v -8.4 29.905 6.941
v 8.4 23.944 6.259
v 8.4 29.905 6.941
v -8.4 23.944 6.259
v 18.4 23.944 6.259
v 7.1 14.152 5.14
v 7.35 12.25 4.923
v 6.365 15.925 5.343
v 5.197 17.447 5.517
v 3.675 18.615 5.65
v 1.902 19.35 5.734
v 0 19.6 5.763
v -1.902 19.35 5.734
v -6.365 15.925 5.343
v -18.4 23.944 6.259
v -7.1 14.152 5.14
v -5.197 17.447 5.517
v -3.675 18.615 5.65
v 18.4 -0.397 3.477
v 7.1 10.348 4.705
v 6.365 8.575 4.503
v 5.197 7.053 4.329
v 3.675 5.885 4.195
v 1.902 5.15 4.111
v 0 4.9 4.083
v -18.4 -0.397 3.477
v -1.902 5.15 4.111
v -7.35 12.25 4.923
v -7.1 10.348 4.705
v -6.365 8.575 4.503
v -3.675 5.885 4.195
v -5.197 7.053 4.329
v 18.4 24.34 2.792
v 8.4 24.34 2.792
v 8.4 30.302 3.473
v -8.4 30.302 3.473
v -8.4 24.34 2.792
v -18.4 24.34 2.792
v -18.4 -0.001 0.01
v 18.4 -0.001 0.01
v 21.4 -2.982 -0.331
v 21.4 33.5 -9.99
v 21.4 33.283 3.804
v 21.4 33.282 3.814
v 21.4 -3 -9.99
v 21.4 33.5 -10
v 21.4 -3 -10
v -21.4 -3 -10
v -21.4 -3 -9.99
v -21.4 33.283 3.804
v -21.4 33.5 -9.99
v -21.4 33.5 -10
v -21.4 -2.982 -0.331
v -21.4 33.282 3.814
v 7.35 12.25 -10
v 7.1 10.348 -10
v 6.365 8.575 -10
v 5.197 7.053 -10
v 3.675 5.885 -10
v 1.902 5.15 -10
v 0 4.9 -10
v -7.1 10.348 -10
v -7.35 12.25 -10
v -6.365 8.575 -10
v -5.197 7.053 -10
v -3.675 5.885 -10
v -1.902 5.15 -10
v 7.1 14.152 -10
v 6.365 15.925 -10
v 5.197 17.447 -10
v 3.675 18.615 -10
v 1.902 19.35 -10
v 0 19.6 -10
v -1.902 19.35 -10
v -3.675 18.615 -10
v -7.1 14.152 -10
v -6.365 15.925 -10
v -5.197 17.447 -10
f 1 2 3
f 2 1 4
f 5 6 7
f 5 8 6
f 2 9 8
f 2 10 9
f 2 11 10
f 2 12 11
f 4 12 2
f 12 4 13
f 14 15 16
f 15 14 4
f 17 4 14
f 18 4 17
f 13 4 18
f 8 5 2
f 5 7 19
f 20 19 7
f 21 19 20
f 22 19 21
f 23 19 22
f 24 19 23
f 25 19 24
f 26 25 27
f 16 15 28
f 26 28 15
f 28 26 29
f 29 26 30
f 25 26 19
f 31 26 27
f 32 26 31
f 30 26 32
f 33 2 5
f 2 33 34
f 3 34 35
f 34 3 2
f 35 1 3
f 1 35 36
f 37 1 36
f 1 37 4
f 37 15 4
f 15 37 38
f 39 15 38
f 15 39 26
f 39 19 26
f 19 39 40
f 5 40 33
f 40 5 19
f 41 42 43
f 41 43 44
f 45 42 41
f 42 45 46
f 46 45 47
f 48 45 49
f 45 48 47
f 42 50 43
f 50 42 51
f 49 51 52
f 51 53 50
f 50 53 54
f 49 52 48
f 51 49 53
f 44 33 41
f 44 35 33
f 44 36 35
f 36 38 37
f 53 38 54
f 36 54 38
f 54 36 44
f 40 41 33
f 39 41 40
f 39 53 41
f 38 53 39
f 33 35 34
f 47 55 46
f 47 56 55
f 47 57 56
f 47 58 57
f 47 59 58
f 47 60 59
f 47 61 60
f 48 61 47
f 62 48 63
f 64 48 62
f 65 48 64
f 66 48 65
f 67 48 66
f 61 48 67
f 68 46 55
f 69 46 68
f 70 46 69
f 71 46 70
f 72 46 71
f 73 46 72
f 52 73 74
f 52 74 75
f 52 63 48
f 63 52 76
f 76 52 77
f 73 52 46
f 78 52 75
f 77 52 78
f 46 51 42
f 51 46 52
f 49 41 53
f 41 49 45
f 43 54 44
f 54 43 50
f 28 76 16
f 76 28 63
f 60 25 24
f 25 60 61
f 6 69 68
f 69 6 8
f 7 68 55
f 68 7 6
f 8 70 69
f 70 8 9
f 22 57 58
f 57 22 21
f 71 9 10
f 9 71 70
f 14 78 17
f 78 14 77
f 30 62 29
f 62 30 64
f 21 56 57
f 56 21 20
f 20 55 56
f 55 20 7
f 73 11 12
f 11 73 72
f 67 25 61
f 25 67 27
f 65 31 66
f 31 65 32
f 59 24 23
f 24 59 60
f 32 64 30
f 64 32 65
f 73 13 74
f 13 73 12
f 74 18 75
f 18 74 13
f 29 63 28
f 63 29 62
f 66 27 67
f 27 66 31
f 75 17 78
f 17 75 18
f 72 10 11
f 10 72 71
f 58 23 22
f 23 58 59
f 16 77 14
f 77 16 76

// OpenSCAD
// replacement feet for Logitech K120

INSERT_H = 3.5;

T_WIDTH = 16.8;
BAR_HEIGHT = 24.5;

FAR_EDGE_DISTANCE = 70;
DESIRED_H = 10;  // at the top of the T
SURVIVING_FEET_OFFSET = 2;
ROT = atan2(DESIRED_H - SURVIVING_FEET_OFFSET, FAR_EDGE_DISTANCE);

module insert_2d(h_expand=10, v_expand=6) {
    translate([-T_WIDTH / 2 - h_expand, 0])
    square([T_WIDTH + h_expand * 2, BAR_HEIGHT])
        ;
    translate([-T_WIDTH / 2, 0])
    square([T_WIDTH, BAR_HEIGHT + v_expand])
        ;
}

module surrounder_plate(h_expand=13, v_expand=12)
linear_extrude(0.01)
translate([-T_WIDTH / 2 - h_expand, -(v_expand-6)/2])
square([T_WIDTH + h_expand * 2, BAR_HEIGHT + v_expand])
    ;

module cap_solid() {
    rotate([ROT, 0, 0])
    linear_extrude(INSERT_H)
    insert_2d()
        ;
    hull() {
        rotate([ROT, 0, 0])
        surrounder_plate()
            ;
        translate([0, 0, -DESIRED_H])
        surrounder_plate()
            ;
    }
        ;
}

difference() {
    cap_solid()
        ;
    // for easier sticking (and un-sticking!)
    translate([0, BAR_HEIGHT / 2, 0])
    cylinder(r=BAR_HEIGHT * 0.3, h=999, center=true)
        ;
}
